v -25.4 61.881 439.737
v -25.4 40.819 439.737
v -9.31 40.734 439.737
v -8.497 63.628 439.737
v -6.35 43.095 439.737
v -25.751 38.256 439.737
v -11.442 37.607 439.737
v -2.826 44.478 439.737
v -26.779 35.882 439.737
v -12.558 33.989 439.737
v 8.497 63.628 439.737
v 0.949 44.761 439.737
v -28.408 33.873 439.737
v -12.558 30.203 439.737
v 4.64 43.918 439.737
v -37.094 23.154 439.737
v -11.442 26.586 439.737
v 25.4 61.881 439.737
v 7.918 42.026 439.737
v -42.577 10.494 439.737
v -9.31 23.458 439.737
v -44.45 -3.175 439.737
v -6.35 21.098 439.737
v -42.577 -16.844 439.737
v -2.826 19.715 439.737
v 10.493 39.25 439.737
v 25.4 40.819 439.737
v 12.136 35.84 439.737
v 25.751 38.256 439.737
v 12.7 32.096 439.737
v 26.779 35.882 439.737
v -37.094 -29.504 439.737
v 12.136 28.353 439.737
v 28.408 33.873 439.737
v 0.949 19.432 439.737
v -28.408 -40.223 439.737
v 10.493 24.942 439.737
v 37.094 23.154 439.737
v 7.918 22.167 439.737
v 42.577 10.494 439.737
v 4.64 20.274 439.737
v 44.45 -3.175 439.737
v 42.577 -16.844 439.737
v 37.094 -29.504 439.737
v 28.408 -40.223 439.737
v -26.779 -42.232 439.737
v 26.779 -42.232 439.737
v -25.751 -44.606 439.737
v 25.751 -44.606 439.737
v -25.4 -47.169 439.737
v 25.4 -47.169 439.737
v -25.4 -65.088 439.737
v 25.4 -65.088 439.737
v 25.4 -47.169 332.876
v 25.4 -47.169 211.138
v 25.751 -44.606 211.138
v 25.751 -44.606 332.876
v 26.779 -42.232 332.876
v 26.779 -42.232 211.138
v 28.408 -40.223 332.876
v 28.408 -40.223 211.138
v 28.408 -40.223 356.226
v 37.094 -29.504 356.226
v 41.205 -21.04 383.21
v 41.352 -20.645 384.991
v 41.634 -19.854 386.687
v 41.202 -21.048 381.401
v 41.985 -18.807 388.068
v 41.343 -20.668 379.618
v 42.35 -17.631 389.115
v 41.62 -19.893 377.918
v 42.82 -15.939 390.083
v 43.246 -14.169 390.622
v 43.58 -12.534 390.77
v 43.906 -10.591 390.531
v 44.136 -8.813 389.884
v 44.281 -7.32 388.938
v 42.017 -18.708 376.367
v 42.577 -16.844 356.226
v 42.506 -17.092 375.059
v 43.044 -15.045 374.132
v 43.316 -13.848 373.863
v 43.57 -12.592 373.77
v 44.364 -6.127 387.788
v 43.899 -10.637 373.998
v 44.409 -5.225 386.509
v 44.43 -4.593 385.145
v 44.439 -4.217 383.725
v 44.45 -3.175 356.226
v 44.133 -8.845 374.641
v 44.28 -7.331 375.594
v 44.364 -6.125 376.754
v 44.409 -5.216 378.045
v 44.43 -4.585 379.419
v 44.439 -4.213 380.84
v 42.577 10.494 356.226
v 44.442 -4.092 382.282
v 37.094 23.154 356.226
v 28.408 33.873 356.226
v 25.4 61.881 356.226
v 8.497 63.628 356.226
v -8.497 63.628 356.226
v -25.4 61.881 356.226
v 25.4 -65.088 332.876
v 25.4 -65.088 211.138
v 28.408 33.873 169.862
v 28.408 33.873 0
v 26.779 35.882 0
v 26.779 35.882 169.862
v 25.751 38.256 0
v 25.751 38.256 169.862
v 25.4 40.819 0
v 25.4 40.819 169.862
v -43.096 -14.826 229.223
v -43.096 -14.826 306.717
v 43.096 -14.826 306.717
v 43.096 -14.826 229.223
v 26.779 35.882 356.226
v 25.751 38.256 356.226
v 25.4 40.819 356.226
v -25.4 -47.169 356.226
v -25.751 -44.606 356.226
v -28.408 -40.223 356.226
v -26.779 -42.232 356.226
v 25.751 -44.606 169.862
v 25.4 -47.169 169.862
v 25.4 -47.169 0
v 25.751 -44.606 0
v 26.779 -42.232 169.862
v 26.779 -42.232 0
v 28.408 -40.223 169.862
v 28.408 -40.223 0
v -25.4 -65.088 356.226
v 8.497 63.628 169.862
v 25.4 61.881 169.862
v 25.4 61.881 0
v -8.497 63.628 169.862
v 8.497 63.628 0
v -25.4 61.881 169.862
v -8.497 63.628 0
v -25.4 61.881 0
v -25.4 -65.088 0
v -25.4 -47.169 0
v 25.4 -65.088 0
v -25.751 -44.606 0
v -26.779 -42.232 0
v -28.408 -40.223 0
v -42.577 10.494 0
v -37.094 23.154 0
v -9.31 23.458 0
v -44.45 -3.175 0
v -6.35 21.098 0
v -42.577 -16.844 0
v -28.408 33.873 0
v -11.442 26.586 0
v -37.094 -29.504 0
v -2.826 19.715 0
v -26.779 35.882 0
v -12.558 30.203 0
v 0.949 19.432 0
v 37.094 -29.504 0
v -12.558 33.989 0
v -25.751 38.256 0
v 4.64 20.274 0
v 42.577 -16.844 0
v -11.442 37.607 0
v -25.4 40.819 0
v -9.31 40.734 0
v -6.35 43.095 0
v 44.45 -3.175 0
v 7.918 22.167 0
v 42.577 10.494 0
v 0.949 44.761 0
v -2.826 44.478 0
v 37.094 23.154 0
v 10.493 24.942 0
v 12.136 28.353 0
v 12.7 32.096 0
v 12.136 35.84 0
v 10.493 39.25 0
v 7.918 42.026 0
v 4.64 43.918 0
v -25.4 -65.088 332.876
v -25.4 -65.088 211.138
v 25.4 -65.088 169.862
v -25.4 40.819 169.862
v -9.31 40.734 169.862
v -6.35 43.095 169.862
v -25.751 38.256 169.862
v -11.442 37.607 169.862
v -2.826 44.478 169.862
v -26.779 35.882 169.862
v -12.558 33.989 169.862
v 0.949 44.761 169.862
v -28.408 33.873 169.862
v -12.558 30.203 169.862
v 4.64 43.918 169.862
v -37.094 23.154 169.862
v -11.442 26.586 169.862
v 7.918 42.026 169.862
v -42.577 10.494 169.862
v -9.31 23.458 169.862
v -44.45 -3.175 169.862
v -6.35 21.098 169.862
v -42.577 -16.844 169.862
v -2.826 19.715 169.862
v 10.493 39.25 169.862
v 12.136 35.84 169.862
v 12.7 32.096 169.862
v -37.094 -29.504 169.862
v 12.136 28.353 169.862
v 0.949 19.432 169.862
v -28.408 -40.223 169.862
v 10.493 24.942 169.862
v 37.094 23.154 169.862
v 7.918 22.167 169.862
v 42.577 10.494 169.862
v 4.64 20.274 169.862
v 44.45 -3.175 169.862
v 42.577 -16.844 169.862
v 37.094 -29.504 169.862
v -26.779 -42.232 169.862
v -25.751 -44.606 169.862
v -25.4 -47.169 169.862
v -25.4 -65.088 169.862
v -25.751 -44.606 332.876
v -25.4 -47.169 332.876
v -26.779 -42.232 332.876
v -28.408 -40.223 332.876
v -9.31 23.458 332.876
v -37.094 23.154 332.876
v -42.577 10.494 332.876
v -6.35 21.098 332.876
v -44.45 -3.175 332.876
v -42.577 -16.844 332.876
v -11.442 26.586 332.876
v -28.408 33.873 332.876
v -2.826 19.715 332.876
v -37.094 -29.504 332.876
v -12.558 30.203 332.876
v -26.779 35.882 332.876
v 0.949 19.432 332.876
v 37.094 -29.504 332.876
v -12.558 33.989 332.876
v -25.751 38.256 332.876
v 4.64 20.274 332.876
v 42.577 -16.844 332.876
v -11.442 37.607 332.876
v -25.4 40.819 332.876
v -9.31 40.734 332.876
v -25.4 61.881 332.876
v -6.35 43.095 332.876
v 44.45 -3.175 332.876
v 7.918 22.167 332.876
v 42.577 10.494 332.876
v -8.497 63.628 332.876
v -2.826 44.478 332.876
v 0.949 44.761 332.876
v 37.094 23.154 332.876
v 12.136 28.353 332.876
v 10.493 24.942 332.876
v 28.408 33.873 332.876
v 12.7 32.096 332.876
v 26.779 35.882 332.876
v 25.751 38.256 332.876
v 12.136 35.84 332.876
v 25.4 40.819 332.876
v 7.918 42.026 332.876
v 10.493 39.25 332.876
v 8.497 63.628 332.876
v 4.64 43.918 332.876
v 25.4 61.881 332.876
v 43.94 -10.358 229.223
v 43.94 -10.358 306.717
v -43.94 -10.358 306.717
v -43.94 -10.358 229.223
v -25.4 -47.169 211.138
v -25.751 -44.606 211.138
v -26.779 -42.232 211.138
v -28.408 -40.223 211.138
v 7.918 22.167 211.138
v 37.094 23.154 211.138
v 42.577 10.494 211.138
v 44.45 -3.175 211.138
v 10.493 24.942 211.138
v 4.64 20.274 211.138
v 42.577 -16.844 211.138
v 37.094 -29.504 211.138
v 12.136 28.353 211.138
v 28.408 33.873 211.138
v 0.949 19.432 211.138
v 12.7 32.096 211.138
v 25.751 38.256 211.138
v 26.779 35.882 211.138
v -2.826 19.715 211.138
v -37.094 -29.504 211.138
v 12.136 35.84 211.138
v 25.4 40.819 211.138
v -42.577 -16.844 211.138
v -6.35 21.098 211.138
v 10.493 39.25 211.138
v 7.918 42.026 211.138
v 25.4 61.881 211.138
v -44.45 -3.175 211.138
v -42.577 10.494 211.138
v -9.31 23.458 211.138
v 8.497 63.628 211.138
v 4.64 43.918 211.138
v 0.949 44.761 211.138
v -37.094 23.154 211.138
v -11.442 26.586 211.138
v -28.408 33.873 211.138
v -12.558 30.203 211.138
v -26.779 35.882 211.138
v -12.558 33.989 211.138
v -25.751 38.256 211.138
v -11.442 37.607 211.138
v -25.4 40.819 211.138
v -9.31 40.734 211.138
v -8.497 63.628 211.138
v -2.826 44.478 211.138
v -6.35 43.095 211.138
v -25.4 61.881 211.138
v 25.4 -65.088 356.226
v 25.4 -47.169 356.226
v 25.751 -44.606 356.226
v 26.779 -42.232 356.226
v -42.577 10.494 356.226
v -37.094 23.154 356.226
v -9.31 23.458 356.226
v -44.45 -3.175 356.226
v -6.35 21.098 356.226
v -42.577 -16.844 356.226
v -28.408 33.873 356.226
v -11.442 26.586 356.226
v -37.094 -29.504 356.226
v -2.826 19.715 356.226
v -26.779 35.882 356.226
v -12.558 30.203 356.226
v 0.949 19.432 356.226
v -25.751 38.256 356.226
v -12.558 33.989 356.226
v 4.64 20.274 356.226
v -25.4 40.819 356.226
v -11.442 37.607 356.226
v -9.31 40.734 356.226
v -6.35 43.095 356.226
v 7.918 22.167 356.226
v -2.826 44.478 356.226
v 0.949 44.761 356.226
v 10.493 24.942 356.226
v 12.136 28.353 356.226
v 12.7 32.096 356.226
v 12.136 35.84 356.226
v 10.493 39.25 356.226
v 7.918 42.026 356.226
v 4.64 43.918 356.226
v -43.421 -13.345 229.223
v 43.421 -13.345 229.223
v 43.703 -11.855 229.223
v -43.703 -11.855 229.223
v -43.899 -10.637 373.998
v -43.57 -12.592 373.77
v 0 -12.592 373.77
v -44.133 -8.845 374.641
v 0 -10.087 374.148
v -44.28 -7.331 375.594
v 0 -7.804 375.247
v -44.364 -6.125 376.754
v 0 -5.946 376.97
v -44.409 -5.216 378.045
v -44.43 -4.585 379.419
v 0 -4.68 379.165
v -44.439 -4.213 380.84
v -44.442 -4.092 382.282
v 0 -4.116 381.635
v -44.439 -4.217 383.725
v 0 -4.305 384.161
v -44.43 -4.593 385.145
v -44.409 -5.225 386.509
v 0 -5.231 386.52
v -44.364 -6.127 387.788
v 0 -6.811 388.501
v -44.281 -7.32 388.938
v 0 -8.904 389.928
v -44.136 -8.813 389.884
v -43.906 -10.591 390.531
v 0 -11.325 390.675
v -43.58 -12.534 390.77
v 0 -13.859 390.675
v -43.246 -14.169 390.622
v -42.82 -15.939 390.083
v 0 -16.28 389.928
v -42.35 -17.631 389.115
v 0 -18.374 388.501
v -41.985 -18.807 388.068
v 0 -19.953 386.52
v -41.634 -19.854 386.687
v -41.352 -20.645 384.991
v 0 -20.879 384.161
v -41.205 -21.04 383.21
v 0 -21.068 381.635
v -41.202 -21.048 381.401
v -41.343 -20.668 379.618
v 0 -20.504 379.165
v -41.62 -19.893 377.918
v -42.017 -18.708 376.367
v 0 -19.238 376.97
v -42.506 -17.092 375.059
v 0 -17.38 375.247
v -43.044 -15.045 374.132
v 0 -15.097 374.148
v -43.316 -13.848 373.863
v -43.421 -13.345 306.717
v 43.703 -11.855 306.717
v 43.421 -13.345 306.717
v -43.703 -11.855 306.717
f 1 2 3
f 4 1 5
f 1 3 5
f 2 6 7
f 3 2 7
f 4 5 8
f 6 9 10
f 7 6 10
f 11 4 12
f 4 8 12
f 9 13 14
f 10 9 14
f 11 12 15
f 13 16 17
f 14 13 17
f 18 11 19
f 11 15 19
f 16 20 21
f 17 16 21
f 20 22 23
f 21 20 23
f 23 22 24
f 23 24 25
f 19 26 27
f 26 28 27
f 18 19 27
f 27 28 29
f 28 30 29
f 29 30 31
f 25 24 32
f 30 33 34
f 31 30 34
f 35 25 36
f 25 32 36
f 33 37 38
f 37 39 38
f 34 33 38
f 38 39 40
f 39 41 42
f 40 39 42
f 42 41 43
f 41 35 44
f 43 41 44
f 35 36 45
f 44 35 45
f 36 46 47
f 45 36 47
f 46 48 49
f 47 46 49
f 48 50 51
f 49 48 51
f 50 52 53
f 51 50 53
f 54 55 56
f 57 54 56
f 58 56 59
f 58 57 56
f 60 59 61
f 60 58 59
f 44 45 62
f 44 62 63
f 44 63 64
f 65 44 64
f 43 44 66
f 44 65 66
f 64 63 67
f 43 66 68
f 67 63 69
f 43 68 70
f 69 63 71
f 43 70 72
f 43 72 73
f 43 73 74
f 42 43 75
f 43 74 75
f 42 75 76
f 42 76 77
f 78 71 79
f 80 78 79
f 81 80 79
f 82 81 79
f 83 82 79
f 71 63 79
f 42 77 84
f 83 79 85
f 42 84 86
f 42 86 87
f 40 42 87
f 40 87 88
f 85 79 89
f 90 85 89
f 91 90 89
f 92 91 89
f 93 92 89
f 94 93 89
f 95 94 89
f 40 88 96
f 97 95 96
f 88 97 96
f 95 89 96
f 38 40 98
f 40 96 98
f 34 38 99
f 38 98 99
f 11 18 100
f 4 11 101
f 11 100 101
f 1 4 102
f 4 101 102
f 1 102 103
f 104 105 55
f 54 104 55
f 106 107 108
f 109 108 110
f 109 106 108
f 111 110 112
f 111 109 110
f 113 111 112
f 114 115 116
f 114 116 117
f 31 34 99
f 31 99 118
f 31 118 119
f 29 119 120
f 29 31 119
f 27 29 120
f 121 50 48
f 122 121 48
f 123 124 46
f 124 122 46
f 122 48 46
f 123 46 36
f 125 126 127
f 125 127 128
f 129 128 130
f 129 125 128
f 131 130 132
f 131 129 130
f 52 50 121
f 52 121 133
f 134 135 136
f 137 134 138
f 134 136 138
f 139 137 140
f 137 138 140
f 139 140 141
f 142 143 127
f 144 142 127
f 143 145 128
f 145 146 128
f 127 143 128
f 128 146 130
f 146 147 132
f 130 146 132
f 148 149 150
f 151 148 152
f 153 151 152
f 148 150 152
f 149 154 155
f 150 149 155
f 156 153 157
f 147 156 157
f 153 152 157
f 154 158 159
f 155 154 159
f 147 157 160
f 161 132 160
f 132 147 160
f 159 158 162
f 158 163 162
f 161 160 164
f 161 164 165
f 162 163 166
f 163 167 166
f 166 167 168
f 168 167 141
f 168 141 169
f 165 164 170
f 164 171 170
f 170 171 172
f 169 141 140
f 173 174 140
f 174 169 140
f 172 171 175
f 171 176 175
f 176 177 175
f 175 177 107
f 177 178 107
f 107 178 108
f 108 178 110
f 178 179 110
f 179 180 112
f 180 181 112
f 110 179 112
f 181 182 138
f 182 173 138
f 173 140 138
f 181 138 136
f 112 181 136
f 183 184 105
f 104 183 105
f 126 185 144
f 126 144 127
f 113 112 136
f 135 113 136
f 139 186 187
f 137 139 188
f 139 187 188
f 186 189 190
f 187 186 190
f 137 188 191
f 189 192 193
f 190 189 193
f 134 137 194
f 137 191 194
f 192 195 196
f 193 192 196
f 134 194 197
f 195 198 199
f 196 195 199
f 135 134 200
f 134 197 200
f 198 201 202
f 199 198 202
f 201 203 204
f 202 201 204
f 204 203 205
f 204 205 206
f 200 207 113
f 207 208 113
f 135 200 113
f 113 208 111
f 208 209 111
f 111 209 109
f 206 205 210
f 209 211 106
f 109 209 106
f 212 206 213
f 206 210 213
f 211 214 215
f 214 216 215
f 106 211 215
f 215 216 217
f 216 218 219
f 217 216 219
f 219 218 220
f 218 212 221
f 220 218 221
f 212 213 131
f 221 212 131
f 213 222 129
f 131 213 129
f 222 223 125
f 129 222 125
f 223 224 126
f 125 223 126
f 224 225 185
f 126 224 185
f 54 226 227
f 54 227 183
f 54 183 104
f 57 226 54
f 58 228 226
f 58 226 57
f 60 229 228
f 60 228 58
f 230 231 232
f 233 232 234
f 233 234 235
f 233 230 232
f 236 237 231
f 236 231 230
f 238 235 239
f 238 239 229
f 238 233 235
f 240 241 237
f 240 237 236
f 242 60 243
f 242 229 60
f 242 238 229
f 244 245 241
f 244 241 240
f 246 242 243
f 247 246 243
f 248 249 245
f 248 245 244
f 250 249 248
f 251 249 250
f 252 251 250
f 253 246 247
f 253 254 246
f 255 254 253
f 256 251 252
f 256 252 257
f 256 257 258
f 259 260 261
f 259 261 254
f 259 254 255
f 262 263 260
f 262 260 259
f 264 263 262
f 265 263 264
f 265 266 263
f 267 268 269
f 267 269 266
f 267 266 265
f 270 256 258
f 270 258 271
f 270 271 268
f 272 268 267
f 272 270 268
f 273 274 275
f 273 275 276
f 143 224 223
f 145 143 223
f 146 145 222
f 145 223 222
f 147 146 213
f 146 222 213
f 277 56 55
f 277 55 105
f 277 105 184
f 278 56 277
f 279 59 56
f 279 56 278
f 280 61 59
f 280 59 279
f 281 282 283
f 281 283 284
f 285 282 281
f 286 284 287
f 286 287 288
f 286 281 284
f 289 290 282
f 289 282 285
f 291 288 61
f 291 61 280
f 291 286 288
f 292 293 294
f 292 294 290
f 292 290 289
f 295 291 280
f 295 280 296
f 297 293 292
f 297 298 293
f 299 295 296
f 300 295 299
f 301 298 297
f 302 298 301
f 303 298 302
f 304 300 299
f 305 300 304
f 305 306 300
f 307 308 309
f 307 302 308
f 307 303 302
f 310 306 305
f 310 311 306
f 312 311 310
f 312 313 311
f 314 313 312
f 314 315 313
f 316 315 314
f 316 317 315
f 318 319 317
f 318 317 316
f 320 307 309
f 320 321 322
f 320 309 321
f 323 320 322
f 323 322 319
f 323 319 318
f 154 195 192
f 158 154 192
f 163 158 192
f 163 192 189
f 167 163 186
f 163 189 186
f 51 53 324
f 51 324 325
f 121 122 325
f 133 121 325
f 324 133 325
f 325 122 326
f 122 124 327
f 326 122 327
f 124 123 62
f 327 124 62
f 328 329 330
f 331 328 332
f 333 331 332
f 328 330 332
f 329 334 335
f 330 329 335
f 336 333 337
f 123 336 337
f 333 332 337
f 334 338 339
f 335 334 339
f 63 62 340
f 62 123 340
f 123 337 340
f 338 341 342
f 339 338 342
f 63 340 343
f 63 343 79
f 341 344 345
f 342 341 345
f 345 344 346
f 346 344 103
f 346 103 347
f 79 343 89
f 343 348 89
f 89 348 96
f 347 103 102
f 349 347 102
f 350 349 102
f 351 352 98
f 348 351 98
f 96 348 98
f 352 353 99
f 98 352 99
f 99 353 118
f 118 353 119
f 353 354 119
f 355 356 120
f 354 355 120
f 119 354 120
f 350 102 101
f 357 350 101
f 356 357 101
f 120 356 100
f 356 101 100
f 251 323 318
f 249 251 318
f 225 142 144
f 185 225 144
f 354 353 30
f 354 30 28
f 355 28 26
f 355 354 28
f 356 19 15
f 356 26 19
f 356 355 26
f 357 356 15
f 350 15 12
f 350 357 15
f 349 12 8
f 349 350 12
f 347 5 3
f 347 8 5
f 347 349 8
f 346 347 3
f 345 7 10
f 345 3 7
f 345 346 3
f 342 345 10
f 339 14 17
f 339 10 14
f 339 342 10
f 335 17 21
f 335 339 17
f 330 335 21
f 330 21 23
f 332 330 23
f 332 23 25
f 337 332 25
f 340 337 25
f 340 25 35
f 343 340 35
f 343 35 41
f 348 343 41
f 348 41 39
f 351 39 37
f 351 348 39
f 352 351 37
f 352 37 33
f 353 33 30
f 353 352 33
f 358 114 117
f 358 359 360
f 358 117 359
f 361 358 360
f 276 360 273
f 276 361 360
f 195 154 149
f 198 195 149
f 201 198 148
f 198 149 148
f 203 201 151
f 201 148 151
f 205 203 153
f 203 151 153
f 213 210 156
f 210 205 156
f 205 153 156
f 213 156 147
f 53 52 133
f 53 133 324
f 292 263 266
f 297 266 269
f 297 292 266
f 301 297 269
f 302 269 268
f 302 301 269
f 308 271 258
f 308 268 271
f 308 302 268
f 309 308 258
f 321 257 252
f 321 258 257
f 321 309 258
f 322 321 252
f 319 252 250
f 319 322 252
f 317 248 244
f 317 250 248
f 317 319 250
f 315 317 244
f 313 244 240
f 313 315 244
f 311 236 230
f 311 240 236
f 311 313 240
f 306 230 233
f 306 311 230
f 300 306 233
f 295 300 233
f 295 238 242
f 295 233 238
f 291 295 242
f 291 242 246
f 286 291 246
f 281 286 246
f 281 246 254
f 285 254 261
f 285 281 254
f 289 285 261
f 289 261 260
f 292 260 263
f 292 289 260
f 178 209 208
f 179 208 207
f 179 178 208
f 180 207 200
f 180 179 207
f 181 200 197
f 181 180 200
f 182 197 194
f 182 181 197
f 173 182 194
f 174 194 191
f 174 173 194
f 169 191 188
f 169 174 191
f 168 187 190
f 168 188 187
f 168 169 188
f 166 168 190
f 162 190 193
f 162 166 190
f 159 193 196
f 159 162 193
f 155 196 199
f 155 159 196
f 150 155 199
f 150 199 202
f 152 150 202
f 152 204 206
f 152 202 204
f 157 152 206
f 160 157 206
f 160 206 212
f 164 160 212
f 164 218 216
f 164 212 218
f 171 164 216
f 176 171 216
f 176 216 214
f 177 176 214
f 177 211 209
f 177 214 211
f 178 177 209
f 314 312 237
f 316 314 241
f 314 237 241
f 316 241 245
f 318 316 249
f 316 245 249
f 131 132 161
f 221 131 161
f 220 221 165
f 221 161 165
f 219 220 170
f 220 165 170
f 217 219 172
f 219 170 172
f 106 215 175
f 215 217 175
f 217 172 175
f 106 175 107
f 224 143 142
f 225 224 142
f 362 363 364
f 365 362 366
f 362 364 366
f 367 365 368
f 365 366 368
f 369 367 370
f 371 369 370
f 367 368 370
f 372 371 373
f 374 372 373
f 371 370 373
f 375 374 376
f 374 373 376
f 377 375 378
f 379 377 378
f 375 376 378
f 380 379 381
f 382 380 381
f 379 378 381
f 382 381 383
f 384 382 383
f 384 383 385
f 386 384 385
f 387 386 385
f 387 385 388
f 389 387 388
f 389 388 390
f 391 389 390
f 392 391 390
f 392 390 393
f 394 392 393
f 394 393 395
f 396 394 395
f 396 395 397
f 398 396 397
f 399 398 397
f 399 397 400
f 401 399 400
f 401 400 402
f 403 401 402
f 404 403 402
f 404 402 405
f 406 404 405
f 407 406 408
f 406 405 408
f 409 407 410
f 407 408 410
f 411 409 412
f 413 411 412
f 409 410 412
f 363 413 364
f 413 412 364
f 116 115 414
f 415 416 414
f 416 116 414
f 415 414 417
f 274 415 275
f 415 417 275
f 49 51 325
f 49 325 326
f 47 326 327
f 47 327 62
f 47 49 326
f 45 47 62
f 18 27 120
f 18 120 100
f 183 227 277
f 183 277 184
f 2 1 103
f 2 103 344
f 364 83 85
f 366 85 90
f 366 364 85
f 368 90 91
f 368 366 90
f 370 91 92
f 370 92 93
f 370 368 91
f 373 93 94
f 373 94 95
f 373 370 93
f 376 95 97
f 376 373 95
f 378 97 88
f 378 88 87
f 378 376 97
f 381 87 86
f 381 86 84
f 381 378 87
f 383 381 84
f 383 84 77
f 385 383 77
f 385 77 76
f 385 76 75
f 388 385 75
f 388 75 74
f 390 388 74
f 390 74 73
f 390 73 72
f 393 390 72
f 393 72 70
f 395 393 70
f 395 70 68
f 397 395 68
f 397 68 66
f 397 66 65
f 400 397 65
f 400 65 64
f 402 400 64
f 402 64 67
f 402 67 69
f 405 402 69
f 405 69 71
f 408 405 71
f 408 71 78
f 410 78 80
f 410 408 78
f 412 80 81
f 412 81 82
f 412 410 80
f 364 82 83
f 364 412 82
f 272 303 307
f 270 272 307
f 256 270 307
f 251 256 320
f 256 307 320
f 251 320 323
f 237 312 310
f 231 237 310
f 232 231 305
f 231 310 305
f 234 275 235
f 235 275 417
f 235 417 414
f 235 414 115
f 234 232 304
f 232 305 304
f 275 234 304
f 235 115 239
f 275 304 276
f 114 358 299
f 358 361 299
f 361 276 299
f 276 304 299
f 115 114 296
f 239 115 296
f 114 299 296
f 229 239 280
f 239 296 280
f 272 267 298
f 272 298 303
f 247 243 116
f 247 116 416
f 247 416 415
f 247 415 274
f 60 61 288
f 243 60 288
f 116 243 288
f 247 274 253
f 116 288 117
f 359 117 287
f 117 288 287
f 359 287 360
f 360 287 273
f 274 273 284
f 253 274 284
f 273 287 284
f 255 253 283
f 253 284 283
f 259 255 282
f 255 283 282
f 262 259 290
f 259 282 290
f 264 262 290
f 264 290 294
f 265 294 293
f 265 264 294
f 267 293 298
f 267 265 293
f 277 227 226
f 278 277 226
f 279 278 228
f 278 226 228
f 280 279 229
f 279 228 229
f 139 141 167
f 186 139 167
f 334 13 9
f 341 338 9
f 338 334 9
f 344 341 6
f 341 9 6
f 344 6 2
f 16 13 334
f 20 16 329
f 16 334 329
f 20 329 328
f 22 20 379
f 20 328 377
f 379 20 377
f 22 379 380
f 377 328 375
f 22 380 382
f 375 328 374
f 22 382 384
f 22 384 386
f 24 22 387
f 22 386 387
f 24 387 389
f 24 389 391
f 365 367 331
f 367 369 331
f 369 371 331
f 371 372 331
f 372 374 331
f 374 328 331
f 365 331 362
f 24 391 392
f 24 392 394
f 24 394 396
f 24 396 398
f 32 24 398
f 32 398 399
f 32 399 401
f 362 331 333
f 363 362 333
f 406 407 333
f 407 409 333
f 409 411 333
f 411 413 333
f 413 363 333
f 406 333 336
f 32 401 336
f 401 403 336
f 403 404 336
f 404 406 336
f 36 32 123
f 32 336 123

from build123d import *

# Parameters (mm, degrees)
SKETCH1_R               = 12.7
BOSS_EXTRUDE1_DEPTH     = 711.2
FILLET1_R               = 9.525
SKETCH2_W               = 95.25
SKETCH2_H               = 3.175
CUT_EXTRUDE1_DEPTH      = 1400.048
SKETCH3_R               = 13.346875
SKETCH3_R_2             = 6.746875
SKETCH3_W               = 77.49375
SKETCH3_H               = 4.46875
CUT_EXTRUDE2_DEPTH      = 1400.048
CUT_EXTRUDE2_DEPTH_BACK = 1400.048
SKETCH4_R               = 15.5
SKETCH4_R_2             = 8.5
CUT_EXTRUDE3_DEPTH      = 45.4500001
CUT_EXTRUDE3_DEPTH_BACK = 45.4500001
CUT_EXTRUDE4_DEPTH      = 38.1
CUT_EXTRUDE5_DEPTH      = 23.350000036
SKETCH7_R               = 90.857571738
CUT_EXTRUDE6_DEPTH      = 302.514


with BuildPart() as part:
    # Sketch1 → Boss-Extrude1 (new body)
    with BuildSketch(Plane.XY):
        with BuildLine():
            Line((-25.4, -65.0875), (25.4, -65.0875))
            Line((25.4, -65.0875), (25.4, -42.83073728))
            ThreePointArc((25.4, -42.83073728), (44.45, -3.17499999), (25.4, 36.4807373))
            Line((25.4, 36.4807373), (25.4, 61.8807373))
            ThreePointArc((25.4, 61.8807373), (0, 63.846283551), (-25.4, 61.8807373))
            Line((-25.4, 61.8807373), (-25.4, 36.4807373))
            ThreePointArc((-25.4, 36.4807373), (-44.45, -3.17499999), (-25.4, -42.83073728))
            Line((-25.4, -42.83073728), (-25.4, -65.0875))
        make_face()
        with Locations((0, 32.096283551)):
            Circle(SKETCH1_R, mode=Mode.SUBTRACT)
    extrude(amount=BOSS_EXTRUDE1_DEPTH)

    # Fillet1
    fillet1_edges = [part.edges().sort_by_distance(p)[0] for p in [
        (25.4, 36.4807373, 355.6),
        (25.4, -42.83073728, 355.6),
        (-25.4, -42.83073728, 355.6),
        (-25.4, 36.4807373, 355.6),
    ]]
    fillet(fillet1_edges, radius=FILLET1_R)

    # Sketch2 → Cut-Extrude1 (cut)
    with BuildSketch(Plane(origin=(-606.966916913, -895.257535636, -922.36020311), x_dir=(1, 0, 0), z_dir=(0, 1, 0))):
        with Locations((606.425, -1093.81020311)):
            Rectangle(SKETCH2_W, SKETCH2_H)
        with Locations((606.425, -1363.68520311)):
            Rectangle(SKETCH2_W, SKETCH2_H)
    extrude(amount=CUT_EXTRUDE1_DEPTH, mode=Mode.SUBTRACT)

    # Sketch3 → Cut-Extrude2 (cut, two sides)
    with BuildSketch(Plane(origin=(0, 0, 0), x_dir=(0, 0, -1), z_dir=(1, 0, 0))) as cut_extrude2_sk:
        with Locations((-191.770000017, -12.5920627)):
            Circle(SKETCH3_R)
        with Locations((-382.270000017, -12.5920627)):
            Circle(SKETCH3_R_2)
        with Locations((-267.97, -12.5920627)):
            Rectangle(SKETCH3_W, SKETCH3_H)
    extrude(amount=CUT_EXTRUDE2_DEPTH, mode=Mode.SUBTRACT)
    extrude(cut_extrude2_sk.sketch, amount=-CUT_EXTRUDE2_DEPTH_BACK, mode=Mode.SUBTRACT)

    # Sketch4 → Cut-Extrude3 (cut, two sides)
    with BuildSketch(Plane(origin=(0, 0, 0), x_dir=(0, 0, -1), z_dir=(1, 0, 0))) as cut_extrude3_sk:
        with Locations((-191.770000017, -12.5920627)):
            Circle(SKETCH4_R)
        with Locations((-382.270000017, -12.5920627)):
            Circle(SKETCH4_R_2)
    extrude(amount=CUT_EXTRUDE3_DEPTH, mode=Mode.SUBTRACT)
    extrude(cut_extrude3_sk.sketch, amount=-CUT_EXTRUDE3_DEPTH_BACK, mode=Mode.SUBTRACT)

    # Sketch5 → Cut-Extrude4 (cut)
    with BuildSketch(Plane(origin=(0, 0, 173.0375), x_dir=(-1, 0, 0), z_dir=(0, 0, -1))):
        with BuildLine():
            Line((25.4, 40.819090522), (25.4, 61.8807373))
            ThreePointArc((25.4, 61.8807373), (0, 63.846283551), (-25.4, 61.8807373))
            Line((-25.4, 61.8807373), (-25.4, 40.819090522))
            ThreePointArc((-25.4, 40.819090522), (-26.18426054, 37.034239312), (-28.407894737, 33.872655178))
            ThreePointArc((-28.407894737, 33.872655178), (-44.45, -3.17499999), (-28.407894737, -40.222655158))
            ThreePointArc((-28.407894737, -40.222655158), (-26.18426054, -43.384239292), (-25.4, -47.169090502))
            Line((-25.4, -47.169090502), (-25.4, -65.0875))
            Line((-25.4, -65.0875), (25.4, -65.0875))
            Line((25.4, -65.0875), (25.4, -47.169090502))
            ThreePointArc((25.4, -47.169090502), (26.18426054, -43.384239292), (28.407894737, -40.222655158))
            ThreePointArc((28.407894737, -40.222655158), (44.45, -3.17499999), (28.407894737, 33.872655178))
            ThreePointArc((28.407894737, 33.872655178), (26.18426054, 37.034239312), (25.4, 40.819090522))
        make_face()
    extrude(amount=-CUT_EXTRUDE4_DEPTH, mode=Mode.SUBTRACT)

    # Sketch6 → Cut-Extrude5 (cut)
    with BuildSketch(Plane.XY.offset(356.226000018)):
        with BuildLine():
            Line((-25.4, 61.8807373), (-25.4, 40.819090522))
            ThreePointArc((-25.4, 40.819090522), (-26.18426054, 37.034239312), (-28.407894737, 33.872655178))
            ThreePointArc((-28.407894737, 33.872655178), (-44.45, -3.17499999), (-28.407894737, -40.222655158))
            ThreePointArc((-28.407894737, -40.222655158), (-26.18426054, -43.384239292), (-25.4, -47.169090502))
            Line((-25.4, -47.169090502), (-25.4, -65.0875))
            Line((-25.4, -65.0875), (25.4, -65.0875))
            Line((25.4, -65.0875), (25.4, -47.169090502))
            ThreePointArc((25.4, -47.169090502), (26.18426054, -43.384239292), (28.407894737, -40.222655158))
            ThreePointArc((28.407894737, -40.222655158), (44.45, -3.17499999), (28.407894737, 33.872655178))
            ThreePointArc((28.407894737, 33.872655178), (26.18426054, 37.034239312), (25.4, 40.819090522))
            Line((25.4, 40.819090522), (25.4, 61.8807373))
            ThreePointArc((25.4, 61.8807373), (0, 63.846283551), (-25.4, 61.8807373))
        make_face()
    extrude(amount=-CUT_EXTRUDE5_DEPTH, mode=Mode.SUBTRACT)

    # Sketch7 → Cut-Extrude6 (cut)
    with BuildSketch(Plane(origin=(0, 0, 442.9125), x_dir=(-1, 0, 0), z_dir=(0, 0, -1))):
        Circle(SKETCH7_R)
    extrude(amount=-CUT_EXTRUDE6_DEPTH, mode=Mode.SUBTRACT)


solid = part.part
